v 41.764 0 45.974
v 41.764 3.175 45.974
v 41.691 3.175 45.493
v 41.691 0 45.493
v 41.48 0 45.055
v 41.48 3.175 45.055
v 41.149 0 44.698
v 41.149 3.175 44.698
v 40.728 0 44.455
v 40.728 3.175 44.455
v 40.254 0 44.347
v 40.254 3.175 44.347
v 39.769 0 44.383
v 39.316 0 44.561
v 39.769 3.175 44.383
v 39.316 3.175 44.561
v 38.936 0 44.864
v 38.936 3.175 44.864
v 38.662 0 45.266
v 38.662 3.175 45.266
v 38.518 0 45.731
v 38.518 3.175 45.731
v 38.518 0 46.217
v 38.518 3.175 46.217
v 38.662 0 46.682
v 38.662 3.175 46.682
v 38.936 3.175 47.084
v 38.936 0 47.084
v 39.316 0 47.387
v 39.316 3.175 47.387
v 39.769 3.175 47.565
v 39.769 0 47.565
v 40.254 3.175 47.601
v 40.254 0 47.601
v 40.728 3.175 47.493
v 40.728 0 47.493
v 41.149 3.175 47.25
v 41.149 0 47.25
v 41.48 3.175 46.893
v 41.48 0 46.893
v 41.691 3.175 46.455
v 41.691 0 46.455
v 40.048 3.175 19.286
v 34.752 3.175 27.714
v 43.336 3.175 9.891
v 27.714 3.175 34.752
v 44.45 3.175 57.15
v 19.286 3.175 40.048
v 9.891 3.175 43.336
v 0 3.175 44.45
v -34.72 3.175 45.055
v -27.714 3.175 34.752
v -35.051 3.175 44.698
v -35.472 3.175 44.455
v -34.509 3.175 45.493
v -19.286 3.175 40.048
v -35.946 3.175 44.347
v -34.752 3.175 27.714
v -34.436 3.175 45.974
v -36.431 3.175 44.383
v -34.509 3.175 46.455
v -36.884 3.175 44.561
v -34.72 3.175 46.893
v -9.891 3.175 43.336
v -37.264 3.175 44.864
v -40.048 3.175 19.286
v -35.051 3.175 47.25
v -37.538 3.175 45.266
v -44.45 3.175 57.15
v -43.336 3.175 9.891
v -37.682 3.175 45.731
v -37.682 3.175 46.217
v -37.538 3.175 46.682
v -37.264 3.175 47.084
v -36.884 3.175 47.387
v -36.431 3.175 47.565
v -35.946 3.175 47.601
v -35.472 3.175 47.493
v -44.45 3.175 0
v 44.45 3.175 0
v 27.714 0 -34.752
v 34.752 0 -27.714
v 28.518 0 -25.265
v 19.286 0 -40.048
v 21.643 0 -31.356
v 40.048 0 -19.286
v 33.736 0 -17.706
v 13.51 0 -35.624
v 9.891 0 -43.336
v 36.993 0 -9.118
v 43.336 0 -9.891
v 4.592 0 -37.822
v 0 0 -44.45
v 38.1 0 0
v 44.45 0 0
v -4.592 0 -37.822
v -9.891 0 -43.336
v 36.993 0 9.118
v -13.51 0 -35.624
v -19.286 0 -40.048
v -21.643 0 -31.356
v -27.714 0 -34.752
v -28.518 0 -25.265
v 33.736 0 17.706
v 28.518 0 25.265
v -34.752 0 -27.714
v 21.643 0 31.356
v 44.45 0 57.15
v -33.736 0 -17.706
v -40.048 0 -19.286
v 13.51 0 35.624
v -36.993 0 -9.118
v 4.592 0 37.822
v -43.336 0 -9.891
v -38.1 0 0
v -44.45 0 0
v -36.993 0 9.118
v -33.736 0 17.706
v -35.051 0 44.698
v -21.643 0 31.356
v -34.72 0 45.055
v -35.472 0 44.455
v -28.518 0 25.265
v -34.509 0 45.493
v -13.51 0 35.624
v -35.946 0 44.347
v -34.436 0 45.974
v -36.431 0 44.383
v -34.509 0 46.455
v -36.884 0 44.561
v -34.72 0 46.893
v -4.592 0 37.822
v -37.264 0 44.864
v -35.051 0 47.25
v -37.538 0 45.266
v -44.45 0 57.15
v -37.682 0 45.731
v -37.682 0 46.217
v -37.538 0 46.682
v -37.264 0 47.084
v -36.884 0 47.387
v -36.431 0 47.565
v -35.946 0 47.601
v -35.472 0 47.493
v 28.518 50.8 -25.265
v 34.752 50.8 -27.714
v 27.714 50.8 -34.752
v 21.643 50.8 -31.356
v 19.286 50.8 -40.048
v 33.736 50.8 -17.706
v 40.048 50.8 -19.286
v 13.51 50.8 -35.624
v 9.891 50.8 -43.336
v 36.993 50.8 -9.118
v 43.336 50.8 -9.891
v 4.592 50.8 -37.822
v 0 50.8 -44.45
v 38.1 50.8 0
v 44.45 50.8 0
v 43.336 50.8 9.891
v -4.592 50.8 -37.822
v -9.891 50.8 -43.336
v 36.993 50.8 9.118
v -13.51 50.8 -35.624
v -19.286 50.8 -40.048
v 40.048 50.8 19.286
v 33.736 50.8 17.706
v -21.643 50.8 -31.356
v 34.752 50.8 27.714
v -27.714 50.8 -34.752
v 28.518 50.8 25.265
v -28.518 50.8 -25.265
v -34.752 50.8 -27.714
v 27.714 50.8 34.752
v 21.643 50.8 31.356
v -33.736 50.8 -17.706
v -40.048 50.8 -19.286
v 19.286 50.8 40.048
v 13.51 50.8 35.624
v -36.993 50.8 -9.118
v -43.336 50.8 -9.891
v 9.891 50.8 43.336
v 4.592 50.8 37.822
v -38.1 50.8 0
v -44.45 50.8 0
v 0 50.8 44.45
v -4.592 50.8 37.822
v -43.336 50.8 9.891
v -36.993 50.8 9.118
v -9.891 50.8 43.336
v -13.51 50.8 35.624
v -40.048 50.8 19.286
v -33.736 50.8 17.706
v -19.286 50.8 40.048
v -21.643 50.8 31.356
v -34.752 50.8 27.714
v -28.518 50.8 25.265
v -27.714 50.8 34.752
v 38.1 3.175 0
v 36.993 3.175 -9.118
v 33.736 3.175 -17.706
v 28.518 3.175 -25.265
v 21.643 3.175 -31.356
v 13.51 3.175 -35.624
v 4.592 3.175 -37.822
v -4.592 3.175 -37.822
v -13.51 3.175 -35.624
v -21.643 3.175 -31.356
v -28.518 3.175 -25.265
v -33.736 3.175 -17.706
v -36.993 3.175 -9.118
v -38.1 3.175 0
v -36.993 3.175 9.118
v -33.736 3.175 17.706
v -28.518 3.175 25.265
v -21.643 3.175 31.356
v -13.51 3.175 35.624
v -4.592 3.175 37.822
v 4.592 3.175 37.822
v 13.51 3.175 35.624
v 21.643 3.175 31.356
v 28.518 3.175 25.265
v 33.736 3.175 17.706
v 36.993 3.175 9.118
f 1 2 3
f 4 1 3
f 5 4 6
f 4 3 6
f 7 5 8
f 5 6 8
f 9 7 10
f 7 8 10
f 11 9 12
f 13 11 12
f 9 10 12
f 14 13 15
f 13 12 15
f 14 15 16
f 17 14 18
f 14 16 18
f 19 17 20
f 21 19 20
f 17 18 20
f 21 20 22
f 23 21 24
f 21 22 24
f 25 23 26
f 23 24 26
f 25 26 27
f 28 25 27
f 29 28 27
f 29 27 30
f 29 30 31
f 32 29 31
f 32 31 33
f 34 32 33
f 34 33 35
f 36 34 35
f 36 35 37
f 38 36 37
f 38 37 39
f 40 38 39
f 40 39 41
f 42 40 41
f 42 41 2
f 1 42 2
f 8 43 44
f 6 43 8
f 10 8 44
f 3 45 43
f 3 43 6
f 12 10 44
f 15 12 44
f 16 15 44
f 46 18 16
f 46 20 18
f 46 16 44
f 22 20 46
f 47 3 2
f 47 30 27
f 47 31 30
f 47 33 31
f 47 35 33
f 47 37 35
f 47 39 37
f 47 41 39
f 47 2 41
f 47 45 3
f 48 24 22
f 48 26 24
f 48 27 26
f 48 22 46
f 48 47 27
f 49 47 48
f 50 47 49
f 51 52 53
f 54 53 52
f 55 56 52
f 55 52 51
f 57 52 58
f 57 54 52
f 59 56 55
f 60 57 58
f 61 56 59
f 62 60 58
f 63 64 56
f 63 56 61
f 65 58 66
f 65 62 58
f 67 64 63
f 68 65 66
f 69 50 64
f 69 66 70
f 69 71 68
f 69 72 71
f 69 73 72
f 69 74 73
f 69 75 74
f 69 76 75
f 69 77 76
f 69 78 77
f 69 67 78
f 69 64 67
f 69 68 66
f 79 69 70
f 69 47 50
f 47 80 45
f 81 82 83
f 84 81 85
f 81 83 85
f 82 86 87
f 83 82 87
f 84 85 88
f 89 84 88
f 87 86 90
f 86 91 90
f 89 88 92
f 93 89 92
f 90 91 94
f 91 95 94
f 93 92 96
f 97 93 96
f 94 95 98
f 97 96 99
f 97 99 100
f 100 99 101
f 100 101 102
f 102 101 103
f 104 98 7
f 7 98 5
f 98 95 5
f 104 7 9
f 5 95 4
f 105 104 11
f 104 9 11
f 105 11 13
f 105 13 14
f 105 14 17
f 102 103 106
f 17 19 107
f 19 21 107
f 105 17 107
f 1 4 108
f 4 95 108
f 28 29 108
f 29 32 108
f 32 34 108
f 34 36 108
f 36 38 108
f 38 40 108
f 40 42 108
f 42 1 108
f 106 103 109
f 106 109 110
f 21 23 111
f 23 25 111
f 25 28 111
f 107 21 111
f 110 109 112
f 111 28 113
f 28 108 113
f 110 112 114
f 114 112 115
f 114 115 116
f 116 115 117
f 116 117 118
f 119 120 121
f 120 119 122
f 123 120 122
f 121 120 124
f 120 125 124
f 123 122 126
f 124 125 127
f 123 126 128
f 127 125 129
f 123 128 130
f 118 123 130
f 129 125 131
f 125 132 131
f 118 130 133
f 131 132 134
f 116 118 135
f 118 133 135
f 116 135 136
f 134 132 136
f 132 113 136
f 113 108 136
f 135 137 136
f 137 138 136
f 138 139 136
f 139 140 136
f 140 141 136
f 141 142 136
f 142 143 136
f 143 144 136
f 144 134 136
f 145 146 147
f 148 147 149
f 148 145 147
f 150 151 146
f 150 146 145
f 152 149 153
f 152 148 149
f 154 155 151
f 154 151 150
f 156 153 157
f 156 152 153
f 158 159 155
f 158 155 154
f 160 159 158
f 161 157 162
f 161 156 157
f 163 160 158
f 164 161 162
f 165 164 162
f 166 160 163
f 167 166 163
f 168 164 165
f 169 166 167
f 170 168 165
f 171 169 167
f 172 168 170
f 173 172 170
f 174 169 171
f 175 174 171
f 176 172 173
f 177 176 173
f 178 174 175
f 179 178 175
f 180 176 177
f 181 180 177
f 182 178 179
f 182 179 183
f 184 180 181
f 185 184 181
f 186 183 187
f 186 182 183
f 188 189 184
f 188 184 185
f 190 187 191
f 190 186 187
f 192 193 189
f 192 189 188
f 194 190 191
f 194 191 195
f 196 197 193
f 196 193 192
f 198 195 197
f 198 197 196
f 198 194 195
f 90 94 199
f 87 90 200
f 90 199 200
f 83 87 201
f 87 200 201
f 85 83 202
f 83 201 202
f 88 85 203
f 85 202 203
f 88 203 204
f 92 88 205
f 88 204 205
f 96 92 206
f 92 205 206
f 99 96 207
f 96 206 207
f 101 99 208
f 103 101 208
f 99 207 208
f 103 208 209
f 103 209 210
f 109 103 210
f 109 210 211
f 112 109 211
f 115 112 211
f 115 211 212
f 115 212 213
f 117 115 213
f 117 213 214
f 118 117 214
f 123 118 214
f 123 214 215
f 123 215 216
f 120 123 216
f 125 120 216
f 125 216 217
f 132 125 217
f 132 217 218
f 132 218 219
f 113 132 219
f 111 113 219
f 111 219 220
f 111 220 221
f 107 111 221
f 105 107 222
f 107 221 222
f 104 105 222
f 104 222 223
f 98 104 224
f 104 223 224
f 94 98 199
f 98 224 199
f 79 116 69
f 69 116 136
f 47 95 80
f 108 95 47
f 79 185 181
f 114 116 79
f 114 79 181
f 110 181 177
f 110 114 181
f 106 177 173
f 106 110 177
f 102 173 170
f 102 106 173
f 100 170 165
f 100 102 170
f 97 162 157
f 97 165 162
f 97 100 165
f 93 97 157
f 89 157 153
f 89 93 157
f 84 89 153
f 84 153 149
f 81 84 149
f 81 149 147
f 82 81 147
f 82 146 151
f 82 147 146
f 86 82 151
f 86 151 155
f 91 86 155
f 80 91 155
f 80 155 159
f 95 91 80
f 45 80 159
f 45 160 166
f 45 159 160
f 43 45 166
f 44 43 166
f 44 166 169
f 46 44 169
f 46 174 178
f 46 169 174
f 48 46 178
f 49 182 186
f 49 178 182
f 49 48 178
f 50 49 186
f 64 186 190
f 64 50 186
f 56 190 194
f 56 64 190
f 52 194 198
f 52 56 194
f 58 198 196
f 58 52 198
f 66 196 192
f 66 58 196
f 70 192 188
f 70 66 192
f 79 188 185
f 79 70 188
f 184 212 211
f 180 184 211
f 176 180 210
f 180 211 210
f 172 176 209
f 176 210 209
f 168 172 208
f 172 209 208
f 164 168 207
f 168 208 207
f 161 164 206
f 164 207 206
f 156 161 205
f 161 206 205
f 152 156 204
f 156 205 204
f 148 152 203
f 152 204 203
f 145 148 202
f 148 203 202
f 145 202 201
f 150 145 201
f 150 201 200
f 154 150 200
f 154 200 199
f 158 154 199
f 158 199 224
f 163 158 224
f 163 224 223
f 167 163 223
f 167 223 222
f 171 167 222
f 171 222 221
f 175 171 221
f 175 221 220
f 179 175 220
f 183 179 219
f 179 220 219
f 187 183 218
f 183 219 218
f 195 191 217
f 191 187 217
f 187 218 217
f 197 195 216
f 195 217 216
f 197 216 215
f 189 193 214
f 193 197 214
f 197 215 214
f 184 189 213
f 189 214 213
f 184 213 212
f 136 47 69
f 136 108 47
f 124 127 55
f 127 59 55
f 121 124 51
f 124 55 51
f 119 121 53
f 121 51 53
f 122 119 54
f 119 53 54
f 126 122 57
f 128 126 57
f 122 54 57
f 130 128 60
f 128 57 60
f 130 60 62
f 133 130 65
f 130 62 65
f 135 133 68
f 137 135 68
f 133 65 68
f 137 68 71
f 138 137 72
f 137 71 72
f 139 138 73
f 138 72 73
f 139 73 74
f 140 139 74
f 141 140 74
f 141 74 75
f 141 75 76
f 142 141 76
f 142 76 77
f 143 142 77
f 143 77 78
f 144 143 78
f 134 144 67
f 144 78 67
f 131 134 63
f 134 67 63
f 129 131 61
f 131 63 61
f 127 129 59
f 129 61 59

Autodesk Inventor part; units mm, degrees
ref_plane "YZ Plane" through (0, 0, 0) normal (1, 0, 0) x (0, 1, 0)
ref_plane "XZ Plane" through (0, 0, 0) normal (0, 1, 0) x (-1, 0, 0)
ref_plane "XY Plane" through (0, 0, 0) normal (0, 0, 1) x (1, 0, 0)
sketch "Sketch1" plane through (0, 0, 0) normal (0, 1, 0) x (-1, 0, 0)
  circle A0 centre (0, 0) radius 38.1
  circle A1 centre (0, 0) radius 44.45
  dimension "d0" = 76.2
  dimension "d1" = 88.9
sketch "Sketch2" plane through (0, 0, 0) normal (0, 1, 0) x (-1, 0, 0)
  circle A0 centre (0, 0) radius 44.45 projected
  line L0 (44.45, 0) -> (44.45, 57.15)
  line L1 (-44.45, 0) -> (-44.45, 57.15)
  line L2 (-44.45, 57.15) -> (44.45, 57.15)
  dimension "d8" = 57.15
extrude "Extrusion1" add sketch "Sketch1" along normal blind 50.8
extrude "Extrusion2" add sketch "Sketch2" along normal blind 3.175
sketch "Sketch3" plane through (0, 3.175, 0) normal (0, 1, 0) x (1, 0, 0)
  circle A0 centre (0, 0) radius 38.1
extrude "Extrusion3" cut sketch "Sketch3" against normal blind 3.175
sketch "Sketch4" plane through (0, 3.175, 0) normal (0, 1, 0) x (1, 0, 0)
  circle A0 centre (-36.068, -45.974) radius 1.6319
  line L0 (-44.45, 0) -> (-44.45, -57.15) projected
  line L1 (-44.45, -57.15) -> (44.45, -57.15) projected
  circle A1 centre (40.132, -45.974) radius 1.6319
  point P0 (0, 0)
  dimension "d11" = 3.2639
  dimension "d12" = 8.382
  dimension "d13" = 11.176
  dimension "d14" = 3.2639
  dimension "d15" = 76.2
  dimension "d16" = 0
extrude "Extrusion4" cut sketch "Sketch4" against normal blind 3.175
properties part number "Battery_holder2"
